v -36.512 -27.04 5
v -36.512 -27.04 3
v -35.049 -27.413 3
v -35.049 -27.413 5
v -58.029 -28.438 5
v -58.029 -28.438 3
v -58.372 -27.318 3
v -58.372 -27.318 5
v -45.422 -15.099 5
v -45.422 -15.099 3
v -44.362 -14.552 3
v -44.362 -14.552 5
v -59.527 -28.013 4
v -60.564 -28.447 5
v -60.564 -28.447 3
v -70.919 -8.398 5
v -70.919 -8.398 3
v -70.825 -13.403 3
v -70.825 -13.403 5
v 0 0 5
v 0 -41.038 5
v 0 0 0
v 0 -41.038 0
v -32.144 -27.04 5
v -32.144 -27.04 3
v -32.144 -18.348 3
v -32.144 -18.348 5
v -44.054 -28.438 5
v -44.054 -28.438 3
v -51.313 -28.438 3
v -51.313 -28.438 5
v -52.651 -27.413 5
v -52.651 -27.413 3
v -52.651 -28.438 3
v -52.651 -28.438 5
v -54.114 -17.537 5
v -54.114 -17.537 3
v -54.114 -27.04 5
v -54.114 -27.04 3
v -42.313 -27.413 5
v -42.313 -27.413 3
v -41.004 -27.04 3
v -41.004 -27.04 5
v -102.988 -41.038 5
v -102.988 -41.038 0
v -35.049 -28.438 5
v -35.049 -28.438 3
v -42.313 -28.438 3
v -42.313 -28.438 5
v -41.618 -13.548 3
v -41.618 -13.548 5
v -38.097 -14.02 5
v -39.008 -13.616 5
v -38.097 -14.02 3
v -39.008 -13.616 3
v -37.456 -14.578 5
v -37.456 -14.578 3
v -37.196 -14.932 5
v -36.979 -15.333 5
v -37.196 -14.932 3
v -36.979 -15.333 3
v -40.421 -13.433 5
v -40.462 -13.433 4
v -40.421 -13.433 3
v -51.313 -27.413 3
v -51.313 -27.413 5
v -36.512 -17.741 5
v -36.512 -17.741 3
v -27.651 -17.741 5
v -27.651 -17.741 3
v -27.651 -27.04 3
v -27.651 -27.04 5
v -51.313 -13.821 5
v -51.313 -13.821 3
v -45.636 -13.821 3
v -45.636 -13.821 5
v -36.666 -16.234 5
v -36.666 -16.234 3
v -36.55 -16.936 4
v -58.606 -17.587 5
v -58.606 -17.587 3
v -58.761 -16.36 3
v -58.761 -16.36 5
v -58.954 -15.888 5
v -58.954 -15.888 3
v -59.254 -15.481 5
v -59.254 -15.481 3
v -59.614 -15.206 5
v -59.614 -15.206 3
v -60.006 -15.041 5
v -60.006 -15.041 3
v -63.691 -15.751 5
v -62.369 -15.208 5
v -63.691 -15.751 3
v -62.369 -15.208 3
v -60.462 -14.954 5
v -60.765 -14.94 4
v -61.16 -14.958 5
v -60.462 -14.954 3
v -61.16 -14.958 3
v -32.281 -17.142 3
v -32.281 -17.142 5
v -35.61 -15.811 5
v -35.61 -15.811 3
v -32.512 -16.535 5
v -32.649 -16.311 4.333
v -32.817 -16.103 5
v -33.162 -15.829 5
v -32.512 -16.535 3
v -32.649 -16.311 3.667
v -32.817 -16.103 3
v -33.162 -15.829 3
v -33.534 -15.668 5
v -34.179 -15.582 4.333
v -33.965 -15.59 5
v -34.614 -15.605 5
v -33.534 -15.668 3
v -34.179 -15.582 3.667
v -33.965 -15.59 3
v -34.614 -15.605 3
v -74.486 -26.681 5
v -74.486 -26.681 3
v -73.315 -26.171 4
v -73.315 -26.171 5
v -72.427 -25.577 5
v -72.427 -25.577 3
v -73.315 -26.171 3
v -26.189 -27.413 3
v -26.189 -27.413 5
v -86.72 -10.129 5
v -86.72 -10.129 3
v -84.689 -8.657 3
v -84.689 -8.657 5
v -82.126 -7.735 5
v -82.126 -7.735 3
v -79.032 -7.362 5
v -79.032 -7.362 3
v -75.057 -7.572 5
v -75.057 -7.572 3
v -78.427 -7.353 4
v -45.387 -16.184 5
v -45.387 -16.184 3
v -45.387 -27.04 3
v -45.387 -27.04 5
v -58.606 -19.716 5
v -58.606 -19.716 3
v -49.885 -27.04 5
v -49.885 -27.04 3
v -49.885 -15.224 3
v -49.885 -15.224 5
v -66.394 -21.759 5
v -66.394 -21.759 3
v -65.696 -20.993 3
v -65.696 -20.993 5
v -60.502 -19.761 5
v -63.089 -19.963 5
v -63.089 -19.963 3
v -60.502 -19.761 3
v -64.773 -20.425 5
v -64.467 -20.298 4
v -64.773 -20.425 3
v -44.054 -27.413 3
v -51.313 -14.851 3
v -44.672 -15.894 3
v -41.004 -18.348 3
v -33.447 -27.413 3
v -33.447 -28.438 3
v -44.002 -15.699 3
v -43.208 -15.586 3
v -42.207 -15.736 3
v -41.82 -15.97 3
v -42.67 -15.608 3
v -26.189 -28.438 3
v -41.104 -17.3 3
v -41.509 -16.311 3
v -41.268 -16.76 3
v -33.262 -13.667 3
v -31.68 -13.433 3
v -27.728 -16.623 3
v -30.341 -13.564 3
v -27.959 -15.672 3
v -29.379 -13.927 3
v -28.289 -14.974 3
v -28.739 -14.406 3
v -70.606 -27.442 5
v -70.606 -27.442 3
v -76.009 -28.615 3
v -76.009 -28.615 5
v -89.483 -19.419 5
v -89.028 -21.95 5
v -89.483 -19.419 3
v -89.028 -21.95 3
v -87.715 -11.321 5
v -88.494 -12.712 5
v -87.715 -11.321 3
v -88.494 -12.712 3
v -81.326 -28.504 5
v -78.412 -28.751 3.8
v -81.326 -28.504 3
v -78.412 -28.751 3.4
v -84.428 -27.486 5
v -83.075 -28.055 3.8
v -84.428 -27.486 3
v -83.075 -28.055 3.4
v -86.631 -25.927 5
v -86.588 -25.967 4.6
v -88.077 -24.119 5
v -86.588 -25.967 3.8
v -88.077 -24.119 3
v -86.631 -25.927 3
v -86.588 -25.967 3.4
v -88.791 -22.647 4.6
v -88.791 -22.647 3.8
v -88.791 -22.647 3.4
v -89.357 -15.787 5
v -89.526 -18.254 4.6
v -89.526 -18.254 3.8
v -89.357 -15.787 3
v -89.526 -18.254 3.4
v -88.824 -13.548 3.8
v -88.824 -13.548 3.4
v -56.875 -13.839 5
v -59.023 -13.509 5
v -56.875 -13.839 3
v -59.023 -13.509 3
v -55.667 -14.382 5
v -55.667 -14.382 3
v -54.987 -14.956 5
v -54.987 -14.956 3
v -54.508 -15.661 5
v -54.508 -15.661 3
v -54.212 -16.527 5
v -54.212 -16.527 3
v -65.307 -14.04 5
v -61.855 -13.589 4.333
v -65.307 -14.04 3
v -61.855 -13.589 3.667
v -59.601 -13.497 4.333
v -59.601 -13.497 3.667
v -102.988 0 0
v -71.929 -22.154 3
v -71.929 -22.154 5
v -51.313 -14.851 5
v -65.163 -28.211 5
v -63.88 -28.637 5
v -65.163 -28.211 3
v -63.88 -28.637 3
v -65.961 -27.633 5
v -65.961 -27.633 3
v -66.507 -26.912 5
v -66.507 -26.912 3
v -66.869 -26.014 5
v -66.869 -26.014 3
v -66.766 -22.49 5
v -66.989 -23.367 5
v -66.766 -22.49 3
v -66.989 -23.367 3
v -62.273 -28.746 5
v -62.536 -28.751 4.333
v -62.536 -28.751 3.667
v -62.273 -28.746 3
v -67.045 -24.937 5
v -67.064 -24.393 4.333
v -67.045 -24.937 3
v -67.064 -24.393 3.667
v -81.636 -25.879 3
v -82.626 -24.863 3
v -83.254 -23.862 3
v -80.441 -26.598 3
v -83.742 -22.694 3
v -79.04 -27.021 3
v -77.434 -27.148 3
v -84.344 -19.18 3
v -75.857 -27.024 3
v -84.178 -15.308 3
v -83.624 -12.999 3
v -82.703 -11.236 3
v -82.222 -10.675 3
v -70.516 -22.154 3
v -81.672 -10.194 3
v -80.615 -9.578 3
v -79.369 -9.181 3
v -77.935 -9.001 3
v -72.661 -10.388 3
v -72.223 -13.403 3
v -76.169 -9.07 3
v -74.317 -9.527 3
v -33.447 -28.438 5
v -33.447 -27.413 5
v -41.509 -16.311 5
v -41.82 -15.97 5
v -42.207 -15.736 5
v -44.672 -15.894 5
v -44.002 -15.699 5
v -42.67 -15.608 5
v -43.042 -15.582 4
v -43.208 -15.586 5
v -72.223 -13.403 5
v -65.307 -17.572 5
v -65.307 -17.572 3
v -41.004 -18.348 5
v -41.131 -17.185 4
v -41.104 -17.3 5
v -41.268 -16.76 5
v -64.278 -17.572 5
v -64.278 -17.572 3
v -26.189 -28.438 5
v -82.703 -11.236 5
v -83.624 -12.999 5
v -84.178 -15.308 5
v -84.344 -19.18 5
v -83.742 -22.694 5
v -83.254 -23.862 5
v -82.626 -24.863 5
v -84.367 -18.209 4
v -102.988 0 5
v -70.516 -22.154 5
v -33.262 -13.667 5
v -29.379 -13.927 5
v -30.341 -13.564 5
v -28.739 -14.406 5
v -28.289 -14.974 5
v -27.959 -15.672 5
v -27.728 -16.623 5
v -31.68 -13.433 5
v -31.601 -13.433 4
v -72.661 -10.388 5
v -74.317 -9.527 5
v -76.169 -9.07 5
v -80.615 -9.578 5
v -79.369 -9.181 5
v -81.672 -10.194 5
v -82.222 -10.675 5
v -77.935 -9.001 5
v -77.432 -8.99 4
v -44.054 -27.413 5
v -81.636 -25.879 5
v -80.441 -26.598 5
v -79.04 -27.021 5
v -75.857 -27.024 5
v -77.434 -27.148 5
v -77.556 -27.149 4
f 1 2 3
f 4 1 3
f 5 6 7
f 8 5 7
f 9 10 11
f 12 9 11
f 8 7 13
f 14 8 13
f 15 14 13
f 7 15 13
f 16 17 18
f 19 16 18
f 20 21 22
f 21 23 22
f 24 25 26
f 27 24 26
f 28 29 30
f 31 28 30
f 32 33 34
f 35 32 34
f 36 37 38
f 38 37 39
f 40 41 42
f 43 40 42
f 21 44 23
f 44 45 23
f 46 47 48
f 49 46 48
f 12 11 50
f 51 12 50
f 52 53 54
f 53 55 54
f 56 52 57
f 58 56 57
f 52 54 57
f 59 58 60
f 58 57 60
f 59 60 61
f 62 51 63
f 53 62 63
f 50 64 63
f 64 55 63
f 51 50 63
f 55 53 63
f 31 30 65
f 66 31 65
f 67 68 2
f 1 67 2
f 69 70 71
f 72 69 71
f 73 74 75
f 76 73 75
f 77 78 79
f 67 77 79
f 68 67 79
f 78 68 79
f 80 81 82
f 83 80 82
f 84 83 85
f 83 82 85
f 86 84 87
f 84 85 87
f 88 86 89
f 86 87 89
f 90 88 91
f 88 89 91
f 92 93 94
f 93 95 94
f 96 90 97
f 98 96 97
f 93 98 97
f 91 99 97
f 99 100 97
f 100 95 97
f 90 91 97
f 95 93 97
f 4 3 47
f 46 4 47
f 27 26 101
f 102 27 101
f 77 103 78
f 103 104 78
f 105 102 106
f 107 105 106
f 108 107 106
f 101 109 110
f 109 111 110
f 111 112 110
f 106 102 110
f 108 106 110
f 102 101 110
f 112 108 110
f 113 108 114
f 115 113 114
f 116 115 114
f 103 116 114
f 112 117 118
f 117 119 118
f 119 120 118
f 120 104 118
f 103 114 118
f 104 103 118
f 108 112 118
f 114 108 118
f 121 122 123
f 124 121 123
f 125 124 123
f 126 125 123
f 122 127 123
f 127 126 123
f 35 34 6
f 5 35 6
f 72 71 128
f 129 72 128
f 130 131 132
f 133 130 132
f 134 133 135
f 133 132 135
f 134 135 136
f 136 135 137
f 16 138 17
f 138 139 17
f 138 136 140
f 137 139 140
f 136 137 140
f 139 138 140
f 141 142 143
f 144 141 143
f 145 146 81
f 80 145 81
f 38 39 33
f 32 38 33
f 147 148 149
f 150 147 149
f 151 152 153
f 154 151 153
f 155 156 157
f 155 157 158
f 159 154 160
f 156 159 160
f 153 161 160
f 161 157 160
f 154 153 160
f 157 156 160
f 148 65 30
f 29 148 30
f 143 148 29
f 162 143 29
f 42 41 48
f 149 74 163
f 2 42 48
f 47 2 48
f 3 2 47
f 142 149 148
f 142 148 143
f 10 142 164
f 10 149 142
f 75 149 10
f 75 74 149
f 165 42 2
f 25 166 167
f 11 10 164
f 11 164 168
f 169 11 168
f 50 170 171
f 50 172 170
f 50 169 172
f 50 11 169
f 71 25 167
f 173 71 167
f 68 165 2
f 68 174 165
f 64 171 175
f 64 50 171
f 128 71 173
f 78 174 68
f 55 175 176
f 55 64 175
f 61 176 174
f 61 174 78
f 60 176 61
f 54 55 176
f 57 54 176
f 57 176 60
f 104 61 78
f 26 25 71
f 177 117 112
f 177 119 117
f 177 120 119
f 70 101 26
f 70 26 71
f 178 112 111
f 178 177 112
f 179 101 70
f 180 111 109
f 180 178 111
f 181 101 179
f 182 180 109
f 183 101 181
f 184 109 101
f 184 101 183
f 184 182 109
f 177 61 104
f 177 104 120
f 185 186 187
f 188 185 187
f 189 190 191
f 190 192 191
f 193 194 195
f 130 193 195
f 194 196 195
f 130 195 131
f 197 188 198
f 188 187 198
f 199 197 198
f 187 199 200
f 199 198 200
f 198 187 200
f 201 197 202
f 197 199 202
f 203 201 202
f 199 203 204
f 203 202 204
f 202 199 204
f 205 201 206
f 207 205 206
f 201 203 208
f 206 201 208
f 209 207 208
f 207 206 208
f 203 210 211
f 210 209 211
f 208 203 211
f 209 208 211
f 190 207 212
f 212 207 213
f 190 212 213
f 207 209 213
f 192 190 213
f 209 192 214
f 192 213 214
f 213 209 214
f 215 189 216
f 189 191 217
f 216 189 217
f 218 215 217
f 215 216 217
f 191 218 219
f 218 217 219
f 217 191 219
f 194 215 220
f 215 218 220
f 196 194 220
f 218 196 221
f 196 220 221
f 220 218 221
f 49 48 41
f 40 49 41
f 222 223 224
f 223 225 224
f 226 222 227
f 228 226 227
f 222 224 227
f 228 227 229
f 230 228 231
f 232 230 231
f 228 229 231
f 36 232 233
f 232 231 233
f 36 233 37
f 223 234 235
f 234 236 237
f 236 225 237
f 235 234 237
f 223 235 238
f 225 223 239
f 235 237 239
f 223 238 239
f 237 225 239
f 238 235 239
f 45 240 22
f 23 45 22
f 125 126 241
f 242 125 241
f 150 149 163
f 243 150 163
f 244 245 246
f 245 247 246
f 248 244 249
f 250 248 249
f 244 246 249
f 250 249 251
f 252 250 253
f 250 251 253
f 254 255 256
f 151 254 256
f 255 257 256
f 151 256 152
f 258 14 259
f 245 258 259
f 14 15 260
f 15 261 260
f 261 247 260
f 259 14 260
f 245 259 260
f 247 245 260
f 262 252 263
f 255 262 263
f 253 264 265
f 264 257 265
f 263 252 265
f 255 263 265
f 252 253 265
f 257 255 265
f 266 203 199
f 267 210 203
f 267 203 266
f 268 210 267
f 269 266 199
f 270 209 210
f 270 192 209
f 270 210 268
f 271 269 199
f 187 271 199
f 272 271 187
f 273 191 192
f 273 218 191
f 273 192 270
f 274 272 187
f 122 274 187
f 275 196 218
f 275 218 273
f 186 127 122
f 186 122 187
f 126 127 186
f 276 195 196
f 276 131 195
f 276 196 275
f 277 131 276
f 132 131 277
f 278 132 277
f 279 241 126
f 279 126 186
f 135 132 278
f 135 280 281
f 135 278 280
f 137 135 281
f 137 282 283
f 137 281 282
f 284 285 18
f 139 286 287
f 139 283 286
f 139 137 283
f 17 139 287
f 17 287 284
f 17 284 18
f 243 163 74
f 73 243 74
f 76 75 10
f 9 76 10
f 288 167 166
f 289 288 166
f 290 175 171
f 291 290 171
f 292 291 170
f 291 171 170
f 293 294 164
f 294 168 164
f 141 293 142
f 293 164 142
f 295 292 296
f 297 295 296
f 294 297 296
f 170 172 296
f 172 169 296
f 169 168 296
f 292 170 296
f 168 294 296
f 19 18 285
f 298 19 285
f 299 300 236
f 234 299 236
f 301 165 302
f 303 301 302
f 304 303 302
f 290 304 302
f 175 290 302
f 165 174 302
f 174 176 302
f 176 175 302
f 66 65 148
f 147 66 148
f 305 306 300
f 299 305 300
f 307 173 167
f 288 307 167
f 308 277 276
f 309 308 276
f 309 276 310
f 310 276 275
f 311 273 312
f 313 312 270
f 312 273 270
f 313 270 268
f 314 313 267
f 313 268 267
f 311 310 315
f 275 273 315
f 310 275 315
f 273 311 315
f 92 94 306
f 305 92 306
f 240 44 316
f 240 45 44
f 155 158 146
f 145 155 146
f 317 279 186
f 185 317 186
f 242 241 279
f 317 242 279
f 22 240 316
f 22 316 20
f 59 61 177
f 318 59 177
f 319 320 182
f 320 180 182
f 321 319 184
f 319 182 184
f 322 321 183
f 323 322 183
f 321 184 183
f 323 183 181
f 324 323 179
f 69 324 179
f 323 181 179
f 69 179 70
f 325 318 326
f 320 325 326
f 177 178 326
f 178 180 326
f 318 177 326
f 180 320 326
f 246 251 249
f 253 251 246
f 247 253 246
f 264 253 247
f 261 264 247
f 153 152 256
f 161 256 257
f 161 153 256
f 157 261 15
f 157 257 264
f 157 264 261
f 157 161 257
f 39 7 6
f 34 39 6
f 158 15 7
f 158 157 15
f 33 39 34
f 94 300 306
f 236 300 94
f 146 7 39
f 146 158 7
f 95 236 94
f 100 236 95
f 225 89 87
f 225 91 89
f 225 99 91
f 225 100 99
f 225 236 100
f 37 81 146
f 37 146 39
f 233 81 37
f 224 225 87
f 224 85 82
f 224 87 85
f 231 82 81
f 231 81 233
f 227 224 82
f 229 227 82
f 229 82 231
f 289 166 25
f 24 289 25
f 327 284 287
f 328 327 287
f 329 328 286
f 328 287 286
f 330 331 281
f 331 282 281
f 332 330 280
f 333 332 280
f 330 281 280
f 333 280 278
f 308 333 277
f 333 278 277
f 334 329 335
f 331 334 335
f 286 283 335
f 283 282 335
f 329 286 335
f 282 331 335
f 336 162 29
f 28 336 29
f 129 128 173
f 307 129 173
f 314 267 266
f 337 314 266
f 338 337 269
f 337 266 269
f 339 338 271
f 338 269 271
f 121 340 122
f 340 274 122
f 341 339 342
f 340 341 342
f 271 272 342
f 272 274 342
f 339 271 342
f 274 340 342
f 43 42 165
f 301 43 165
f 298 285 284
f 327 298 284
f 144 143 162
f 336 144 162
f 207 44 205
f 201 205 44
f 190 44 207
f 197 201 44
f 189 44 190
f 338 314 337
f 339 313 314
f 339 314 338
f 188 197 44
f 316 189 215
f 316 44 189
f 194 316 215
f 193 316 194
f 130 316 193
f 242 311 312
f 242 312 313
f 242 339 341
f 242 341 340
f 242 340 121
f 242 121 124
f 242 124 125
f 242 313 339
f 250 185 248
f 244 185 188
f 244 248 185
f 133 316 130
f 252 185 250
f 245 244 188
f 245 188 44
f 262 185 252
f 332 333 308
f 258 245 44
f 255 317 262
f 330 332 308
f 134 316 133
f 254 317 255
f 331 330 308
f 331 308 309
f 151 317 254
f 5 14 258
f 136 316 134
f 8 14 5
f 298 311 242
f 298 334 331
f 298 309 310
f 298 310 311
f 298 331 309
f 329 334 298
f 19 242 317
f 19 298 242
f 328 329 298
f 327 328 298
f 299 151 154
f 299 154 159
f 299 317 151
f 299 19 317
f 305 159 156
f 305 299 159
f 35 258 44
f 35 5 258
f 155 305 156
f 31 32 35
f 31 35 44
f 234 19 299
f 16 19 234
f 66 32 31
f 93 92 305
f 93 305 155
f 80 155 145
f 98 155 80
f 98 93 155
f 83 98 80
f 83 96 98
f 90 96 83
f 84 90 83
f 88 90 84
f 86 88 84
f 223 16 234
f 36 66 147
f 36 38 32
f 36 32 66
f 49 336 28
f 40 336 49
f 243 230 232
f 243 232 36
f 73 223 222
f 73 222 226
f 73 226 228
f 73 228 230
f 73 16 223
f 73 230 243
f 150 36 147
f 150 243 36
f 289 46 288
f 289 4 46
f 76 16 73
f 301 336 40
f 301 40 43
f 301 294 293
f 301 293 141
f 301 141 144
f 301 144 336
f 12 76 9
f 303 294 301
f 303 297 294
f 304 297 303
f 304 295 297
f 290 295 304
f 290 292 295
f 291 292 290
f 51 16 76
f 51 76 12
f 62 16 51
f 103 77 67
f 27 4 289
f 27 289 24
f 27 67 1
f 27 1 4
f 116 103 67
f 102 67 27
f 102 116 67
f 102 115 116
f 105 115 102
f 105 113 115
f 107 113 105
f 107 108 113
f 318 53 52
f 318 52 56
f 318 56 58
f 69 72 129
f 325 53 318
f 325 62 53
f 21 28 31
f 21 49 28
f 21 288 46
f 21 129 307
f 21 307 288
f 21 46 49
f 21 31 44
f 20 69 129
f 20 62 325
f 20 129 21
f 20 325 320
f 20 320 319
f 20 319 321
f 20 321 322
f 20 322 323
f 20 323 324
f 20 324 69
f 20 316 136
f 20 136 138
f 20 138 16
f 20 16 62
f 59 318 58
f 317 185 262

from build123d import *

# Parameters (mm, degrees)
F0_W     = 102.9875054955
F0_H     = 41.0375036299
F1_DEPTH = 3
F2_W     = 102.9875054955
F2_H     = 41.0375036299
F3_DEPTH = 2


with BuildPart() as f1:
    # F0 (on Top) → F1 (new body)
    with BuildSketch(Plane.XY):
        with Locations((-51.4937527478, -20.518751815)):
            Rectangle(F0_W, F0_H)
    extrude(amount=F1_DEPTH)

    # F2 (on face) → F3 (join)
    with BuildSketch(Plane.XY.offset(3)):
        with Locations((-51.4937527478, -20.518751815)):
            Rectangle(F2_W, F2_H)
        with BuildLine():
            add(Edge.make_bspline(
                [(-61.8547136732, -13.5894833709), (-60.7502540071, -13.4974450654), (-59.601018949, -13.4974450654)],
                knots=[0, 0, 0, 1, 1, 1], degree=2))
            add(Edge.make_bspline(
                [(-59.601018949, -13.4974450654), (-54.1135459231, -13.4974450654), (-54.1135459231, -17.5371804208)],
                knots=[0, 0, 0, 1, 1, 1], degree=2))
            Line((-54.1135459231, -17.5371804208), (-54.1135459231, -27.0395135845))
            Line((-54.1135459231, -27.0395135845), (-52.650883122, -27.4126418501))
            Line((-52.650883122, -27.4126418501), (-52.650883122, -28.4375008196))
            Line((-52.650883122, -28.4375008196), (-58.02890519, -28.4375008196))
            Line((-58.02890519, -28.4375008196), (-58.3721831944, -27.3181160228))
            add(Edge.make_bspline(
                [(-58.3721831944, -27.3181160228), (-59.5860938184, -28.1439732506), (-60.5636898743, -28.4474509066)],
                knots=[0, 0, 0, 1, 1, 1], degree=2))
            add(Edge.make_bspline(
                [(-60.5636898743, -28.4474509066), (-61.5412859301, -28.7509285627), (-62.5362946383, -28.7509285627)],
                knots=[0, 0, 0, 1, 1, 1], degree=2))
            add(Edge.make_bspline(
                [(-62.5362946383, -28.7509285627), (-67.0635842608, -28.7509285627), (-67.0635842608, -24.3927904206)],
                knots=[0, 0, 0, 1, 1, 1], degree=2))
            add(Edge.make_bspline(
                [(-67.0635842608, -24.3927904206), (-67.0635842608, -22.7460510085), (-66.3944409045, -21.7585048655)],
                knots=[0, 0, 0, 1, 1, 1], degree=2))
            add(Edge.make_bspline(
                [(-66.3944409045, -21.7585048655), (-65.7252975482, -20.7709587226), (-64.4666115323, -20.2983295862)],
                knots=[0, 0, 0, 1, 1, 1], degree=2))
            add(Edge.make_bspline(
                [(-64.4666115323, -20.2983295862), (-63.2079255164, -19.8257004498), (-60.50150183, -19.7610248837)],
                knots=[0, 0, 0, 1, 1, 1], degree=2))
            Line((-60.50150183, -19.7610248837), (-58.6060102408, -19.7162494919))
            Line((-58.6060102408, -19.7162494919), (-58.6060102408, -17.5869308562))
            add(Edge.make_bspline(
                [(-58.6060102408, -17.5869308562), (-58.6060102408, -14.9402076923), (-60.7651791377, -14.9402076923)],
                knots=[0, 0, 0, 1, 1, 1], degree=2))
            add(Edge.make_bspline(
                [(-60.7651791377, -14.9402076923), (-62.073615589, -14.9402076923), (-63.6905047399, -15.7511397895)],
                knots=[0, 0, 0, 1, 1, 1], degree=2))
            Line((-63.6905047399, -15.7511397895), (-64.2775598778, -17.5720057256))
            Line((-64.2775598778, -17.5720057256), (-65.3073938908, -17.5720057256))
            Line((-65.3073938908, -17.5720057256), (-65.3073938908, -14.0397248114))
            add(Edge.make_bspline(
                [(-65.3073938908, -14.0397248114), (-62.9591733393, -13.6815216764), (-61.8547136732, -13.5894833709)],
                knots=[0, 0, 0, 1, 1, 1], degree=2))
        make_face(mode=Mode.SUBTRACT)
        with BuildLine():
            Line((-45.6360717289, -13.8208228956), (-45.4221448567, -15.0994090857))
            Line((-45.4221448567, -15.0994090857), (-44.3624605824, -14.5521542961))
            add(Edge.make_bspline(
                [(-44.3624605824, -14.5521542961), (-42.1883665549, -13.4327694994), (-40.4620264461, -13.4327694994)],
                knots=[0, 0, 0, 1, 1, 1], degree=2))
            add(Edge.make_bspline(
                [(-40.4620264461, -13.4327694994), (-37.850128587, -13.4327694994), (-36.9794959673, -15.3332361321)],
                knots=[0, 0, 0, 1, 1, 1], degree=2))
            add(Edge.make_bspline(
                [(-36.9794959673, -15.3332361321), (-33.7904930574, -13.4327694994), (-31.6014738993, -13.4327694994)],
                knots=[0, 0, 0, 1, 1, 1], degree=2))
            add(Edge.make_bspline(
                [(-31.6014738993, -13.4327694994), (-27.6512893276, -13.4327694994), (-27.6512893276, -17.741157206)],
                knots=[0, 0, 0, 1, 1, 1], degree=2))
            Line((-27.6512893276, -17.741157206), (-27.6512893276, -27.0395135845))
            Line((-27.6512893276, -27.0395135845), (-26.1886265265, -27.4126418501))
            Line((-26.1886265265, -27.4126418501), (-26.1886265265, -28.4375008196))
            Line((-26.1886265265, -28.4375008196), (-33.4472150531, -28.4375008196))
            Line((-33.4472150531, -28.4375008196), (-33.4472150531, -27.4126418501))
            Line((-33.4472150531, -27.4126418501), (-32.1437536453, -27.0395135845))
            Line((-32.1437536453, -27.0395135845), (-32.1437536453, -18.348112518))
            add(Edge.make_bspline(
                [(-32.1437536453, -18.348112518), (-32.1437536453, -17.0396760667), (-32.6487205647, -16.3108321879)],
                knots=[0, 0, 0, 1, 1, 1], degree=2))
            add(Edge.make_bspline(
                [(-32.6487205647, -16.3108321879), (-33.1536874841, -15.5819883091), (-34.1785464536, -15.5819883091)],
                knots=[0, 0, 0, 1, 1, 1], degree=2))
            add(Edge.make_bspline(
                [(-34.1785464536, -15.5819883091), (-35.3327565552, -15.5819883091), (-36.6660682242, -16.233719013)],
                knots=[0, 0, 0, 1, 1, 1], degree=2))
            add(Edge.make_bspline(
                [(-36.6660682242, -16.233719013), (-36.5118418744, -16.8854497169), (-36.5118418744, -17.741157206)],
                knots=[0, 0, 0, 1, 1, 1], degree=2))
            Line((-36.5118418744, -17.741157206), (-36.5118418744, -27.0395135845))
            Line((-36.5118418744, -27.0395135845), (-35.0491790733, -27.4126418501))
            Line((-35.0491790733, -27.4126418501), (-35.0491790733, -28.4375008196))
            Line((-35.0491790733, -28.4375008196), (-42.3127426434, -28.4375008196))
            Line((-42.3127426434, -28.4375008196), (-42.3127426434, -27.4126418501))
            Line((-42.3127426434, -27.4126418501), (-41.0043061921, -27.0395135845))
            Line((-41.0043061921, -27.0395135845), (-41.0043061921, -18.348112518))
            add(Edge.make_bspline(
                [(-41.0043061921, -18.348112518), (-41.0043061921, -17.0396760667), (-41.5092731115, -16.3108321879)],
                knots=[0, 0, 0, 1, 1, 1], degree=2))
            add(Edge.make_bspline(
                [(-41.5092731115, -16.3108321879), (-42.014240031, -15.5819883091), (-43.0415865222, -15.5819883091)],
                knots=[0, 0, 0, 1, 1, 1], degree=2))
            add(Edge.make_bspline(
                [(-43.0415865222, -15.5819883091), (-44.0689330135, -15.5819883091), (-45.3873195519, -16.1839685776)],
                knots=[0, 0, 0, 1, 1, 1], degree=2))
            Line((-45.3873195519, -16.1839685776), (-45.3873195519, -27.0395135845))
            Line((-45.3873195519, -27.0395135845), (-44.0540078829, -27.4126418501))
            Line((-44.0540078829, -27.4126418501), (-44.0540078829, -28.4375008196))
            Line((-44.0540078829, -28.4375008196), (-51.3125964094, -28.4375008196))
            Line((-51.3125964094, -28.4375008196), (-51.3125964094, -27.4126418501))
            Line((-51.3125964094, -27.4126418501), (-49.8847589131, -27.0395135845))
            Line((-49.8847589131, -27.0395135845), (-49.8847589131, -15.2237851742))
            Line((-49.8847589131, -15.2237851742), (-51.3125964094, -14.8506569086))
            Line((-51.3125964094, -14.8506569086), (-51.3125964094, -13.8208228956))
            Line((-51.3125964094, -13.8208228956), (-45.6360717289, -13.8208228956))
        make_face(mode=Mode.SUBTRACT)
        with BuildLine():
            add(Edge.make_bspline(
                [(-74.2475471343, -28.36785021), (-76.4863167278, -28.7509285627), (-78.4116585783, -28.7509285627)],
                knots=[0, 0, 0, 1, 1, 1], degree=2))
            add(Edge.make_bspline(
                [(-78.4116585783, -28.7509285627), (-83.6503794271, -28.7509285627), (-86.5881426382, -25.9673917014)],
                knots=[0, 0, 0, 1, 1, 1], degree=2))
            add(Edge.make_bspline(
                [(-86.5881426382, -25.9673917014), (-89.5259058493, -23.1838548401), (-89.5259058493, -18.2535866908)],
                knots=[0, 0, 0, 1, 1, 1], degree=2))
            add(Edge.make_bspline(
                [(-89.5259058493, -18.2535866908), (-89.5259058493, -12.905414884), (-86.719981292, -10.129340588)],
                knots=[0, 0, 0, 1, 1, 1], degree=2))
            add(Edge.make_bspline(
                [(-86.719981292, -10.129340588), (-83.9140567348, -7.353266292), (-78.4265837089, -7.353266292)],
                knots=[0, 0, 0, 1, 1, 1], degree=2))
            add(Edge.make_bspline(
                [(-78.4265837089, -7.353266292), (-74.8047520109, -7.353266292), (-70.9192430052, -8.3980254357)],
                knots=[0, 0, 0, 1, 1, 1], degree=2))
            Line((-70.9192430052, -8.3980254357), (-70.824717178, -13.4029192381))
            Line((-70.824717178, -13.4029192381), (-72.222704413, -13.4029192381))
            Line((-72.222704413, -13.4029192381), (-72.6605082447, -10.3880428522))
            add(Edge.make_bspline(
                [(-72.6605082447, -10.3880428522), (-74.7102261836, -8.9900556171), (-77.4315750006, -8.9900556171)],
                knots=[0, 0, 0, 1, 1, 1], degree=2))
            add(Edge.make_bspline(
                [(-77.4315750006, -8.9900556171), (-81.038481568, -8.9900556171), (-82.7026336325, -11.2362877759)],
                knots=[0, 0, 0, 1, 1, 1], degree=2))
            add(Edge.make_bspline(
                [(-82.7026336325, -11.2362877759), (-84.3667856971, -13.4825199348), (-84.3667856971, -18.2088112989)],
                knots=[0, 0, 0, 1, 1, 1], degree=2))
            add(Edge.make_bspline(
                [(-84.3667856971, -18.2088112989), (-84.3667856971, -22.5768995281), (-82.6255204576, -24.8629320352)],
                knots=[0, 0, 0, 1, 1, 1], degree=2))
            add(Edge.make_bspline(
                [(-82.6255204576, -24.8629320352), (-80.8842552182, -27.1489645424), (-77.5559510892, -27.1489645424)],
                knots=[0, 0, 0, 1, 1, 1], degree=2))
            add(Edge.make_bspline(
                [(-77.5559510892, -27.1489645424), (-75.7997607191, -27.1489645424), (-74.4863492243, -26.6813104495)],
                knots=[0, 0, 0, 1, 1, 1], degree=2))
            add(Edge.make_bspline(
                [(-74.4863492243, -26.6813104495), (-73.1729377294, -26.2136563567), (-72.4266811982, -25.5768507834)],
                knots=[0, 0, 0, 1, 1, 1], degree=2))
            Line((-72.4266811982, -25.5768507834), (-71.9291768441, -22.1540208271))
            Line((-71.9291768441, -22.1540208271), (-70.5162644784, -22.1540208271))
            Line((-70.5162644784, -22.1540208271), (-70.6058152621, -27.4424921113))
            add(Edge.make_bspline(
                [(-70.6058152621, -27.4424921113), (-72.0087775408, -27.9847718573), (-74.2475471343, -28.36785021)],
                knots=[0, 0, 0, 1, 1, 1], degree=2))
        make_face(mode=Mode.SUBTRACT)
    extrude(amount=F3_DEPTH)


solid = f1.part
